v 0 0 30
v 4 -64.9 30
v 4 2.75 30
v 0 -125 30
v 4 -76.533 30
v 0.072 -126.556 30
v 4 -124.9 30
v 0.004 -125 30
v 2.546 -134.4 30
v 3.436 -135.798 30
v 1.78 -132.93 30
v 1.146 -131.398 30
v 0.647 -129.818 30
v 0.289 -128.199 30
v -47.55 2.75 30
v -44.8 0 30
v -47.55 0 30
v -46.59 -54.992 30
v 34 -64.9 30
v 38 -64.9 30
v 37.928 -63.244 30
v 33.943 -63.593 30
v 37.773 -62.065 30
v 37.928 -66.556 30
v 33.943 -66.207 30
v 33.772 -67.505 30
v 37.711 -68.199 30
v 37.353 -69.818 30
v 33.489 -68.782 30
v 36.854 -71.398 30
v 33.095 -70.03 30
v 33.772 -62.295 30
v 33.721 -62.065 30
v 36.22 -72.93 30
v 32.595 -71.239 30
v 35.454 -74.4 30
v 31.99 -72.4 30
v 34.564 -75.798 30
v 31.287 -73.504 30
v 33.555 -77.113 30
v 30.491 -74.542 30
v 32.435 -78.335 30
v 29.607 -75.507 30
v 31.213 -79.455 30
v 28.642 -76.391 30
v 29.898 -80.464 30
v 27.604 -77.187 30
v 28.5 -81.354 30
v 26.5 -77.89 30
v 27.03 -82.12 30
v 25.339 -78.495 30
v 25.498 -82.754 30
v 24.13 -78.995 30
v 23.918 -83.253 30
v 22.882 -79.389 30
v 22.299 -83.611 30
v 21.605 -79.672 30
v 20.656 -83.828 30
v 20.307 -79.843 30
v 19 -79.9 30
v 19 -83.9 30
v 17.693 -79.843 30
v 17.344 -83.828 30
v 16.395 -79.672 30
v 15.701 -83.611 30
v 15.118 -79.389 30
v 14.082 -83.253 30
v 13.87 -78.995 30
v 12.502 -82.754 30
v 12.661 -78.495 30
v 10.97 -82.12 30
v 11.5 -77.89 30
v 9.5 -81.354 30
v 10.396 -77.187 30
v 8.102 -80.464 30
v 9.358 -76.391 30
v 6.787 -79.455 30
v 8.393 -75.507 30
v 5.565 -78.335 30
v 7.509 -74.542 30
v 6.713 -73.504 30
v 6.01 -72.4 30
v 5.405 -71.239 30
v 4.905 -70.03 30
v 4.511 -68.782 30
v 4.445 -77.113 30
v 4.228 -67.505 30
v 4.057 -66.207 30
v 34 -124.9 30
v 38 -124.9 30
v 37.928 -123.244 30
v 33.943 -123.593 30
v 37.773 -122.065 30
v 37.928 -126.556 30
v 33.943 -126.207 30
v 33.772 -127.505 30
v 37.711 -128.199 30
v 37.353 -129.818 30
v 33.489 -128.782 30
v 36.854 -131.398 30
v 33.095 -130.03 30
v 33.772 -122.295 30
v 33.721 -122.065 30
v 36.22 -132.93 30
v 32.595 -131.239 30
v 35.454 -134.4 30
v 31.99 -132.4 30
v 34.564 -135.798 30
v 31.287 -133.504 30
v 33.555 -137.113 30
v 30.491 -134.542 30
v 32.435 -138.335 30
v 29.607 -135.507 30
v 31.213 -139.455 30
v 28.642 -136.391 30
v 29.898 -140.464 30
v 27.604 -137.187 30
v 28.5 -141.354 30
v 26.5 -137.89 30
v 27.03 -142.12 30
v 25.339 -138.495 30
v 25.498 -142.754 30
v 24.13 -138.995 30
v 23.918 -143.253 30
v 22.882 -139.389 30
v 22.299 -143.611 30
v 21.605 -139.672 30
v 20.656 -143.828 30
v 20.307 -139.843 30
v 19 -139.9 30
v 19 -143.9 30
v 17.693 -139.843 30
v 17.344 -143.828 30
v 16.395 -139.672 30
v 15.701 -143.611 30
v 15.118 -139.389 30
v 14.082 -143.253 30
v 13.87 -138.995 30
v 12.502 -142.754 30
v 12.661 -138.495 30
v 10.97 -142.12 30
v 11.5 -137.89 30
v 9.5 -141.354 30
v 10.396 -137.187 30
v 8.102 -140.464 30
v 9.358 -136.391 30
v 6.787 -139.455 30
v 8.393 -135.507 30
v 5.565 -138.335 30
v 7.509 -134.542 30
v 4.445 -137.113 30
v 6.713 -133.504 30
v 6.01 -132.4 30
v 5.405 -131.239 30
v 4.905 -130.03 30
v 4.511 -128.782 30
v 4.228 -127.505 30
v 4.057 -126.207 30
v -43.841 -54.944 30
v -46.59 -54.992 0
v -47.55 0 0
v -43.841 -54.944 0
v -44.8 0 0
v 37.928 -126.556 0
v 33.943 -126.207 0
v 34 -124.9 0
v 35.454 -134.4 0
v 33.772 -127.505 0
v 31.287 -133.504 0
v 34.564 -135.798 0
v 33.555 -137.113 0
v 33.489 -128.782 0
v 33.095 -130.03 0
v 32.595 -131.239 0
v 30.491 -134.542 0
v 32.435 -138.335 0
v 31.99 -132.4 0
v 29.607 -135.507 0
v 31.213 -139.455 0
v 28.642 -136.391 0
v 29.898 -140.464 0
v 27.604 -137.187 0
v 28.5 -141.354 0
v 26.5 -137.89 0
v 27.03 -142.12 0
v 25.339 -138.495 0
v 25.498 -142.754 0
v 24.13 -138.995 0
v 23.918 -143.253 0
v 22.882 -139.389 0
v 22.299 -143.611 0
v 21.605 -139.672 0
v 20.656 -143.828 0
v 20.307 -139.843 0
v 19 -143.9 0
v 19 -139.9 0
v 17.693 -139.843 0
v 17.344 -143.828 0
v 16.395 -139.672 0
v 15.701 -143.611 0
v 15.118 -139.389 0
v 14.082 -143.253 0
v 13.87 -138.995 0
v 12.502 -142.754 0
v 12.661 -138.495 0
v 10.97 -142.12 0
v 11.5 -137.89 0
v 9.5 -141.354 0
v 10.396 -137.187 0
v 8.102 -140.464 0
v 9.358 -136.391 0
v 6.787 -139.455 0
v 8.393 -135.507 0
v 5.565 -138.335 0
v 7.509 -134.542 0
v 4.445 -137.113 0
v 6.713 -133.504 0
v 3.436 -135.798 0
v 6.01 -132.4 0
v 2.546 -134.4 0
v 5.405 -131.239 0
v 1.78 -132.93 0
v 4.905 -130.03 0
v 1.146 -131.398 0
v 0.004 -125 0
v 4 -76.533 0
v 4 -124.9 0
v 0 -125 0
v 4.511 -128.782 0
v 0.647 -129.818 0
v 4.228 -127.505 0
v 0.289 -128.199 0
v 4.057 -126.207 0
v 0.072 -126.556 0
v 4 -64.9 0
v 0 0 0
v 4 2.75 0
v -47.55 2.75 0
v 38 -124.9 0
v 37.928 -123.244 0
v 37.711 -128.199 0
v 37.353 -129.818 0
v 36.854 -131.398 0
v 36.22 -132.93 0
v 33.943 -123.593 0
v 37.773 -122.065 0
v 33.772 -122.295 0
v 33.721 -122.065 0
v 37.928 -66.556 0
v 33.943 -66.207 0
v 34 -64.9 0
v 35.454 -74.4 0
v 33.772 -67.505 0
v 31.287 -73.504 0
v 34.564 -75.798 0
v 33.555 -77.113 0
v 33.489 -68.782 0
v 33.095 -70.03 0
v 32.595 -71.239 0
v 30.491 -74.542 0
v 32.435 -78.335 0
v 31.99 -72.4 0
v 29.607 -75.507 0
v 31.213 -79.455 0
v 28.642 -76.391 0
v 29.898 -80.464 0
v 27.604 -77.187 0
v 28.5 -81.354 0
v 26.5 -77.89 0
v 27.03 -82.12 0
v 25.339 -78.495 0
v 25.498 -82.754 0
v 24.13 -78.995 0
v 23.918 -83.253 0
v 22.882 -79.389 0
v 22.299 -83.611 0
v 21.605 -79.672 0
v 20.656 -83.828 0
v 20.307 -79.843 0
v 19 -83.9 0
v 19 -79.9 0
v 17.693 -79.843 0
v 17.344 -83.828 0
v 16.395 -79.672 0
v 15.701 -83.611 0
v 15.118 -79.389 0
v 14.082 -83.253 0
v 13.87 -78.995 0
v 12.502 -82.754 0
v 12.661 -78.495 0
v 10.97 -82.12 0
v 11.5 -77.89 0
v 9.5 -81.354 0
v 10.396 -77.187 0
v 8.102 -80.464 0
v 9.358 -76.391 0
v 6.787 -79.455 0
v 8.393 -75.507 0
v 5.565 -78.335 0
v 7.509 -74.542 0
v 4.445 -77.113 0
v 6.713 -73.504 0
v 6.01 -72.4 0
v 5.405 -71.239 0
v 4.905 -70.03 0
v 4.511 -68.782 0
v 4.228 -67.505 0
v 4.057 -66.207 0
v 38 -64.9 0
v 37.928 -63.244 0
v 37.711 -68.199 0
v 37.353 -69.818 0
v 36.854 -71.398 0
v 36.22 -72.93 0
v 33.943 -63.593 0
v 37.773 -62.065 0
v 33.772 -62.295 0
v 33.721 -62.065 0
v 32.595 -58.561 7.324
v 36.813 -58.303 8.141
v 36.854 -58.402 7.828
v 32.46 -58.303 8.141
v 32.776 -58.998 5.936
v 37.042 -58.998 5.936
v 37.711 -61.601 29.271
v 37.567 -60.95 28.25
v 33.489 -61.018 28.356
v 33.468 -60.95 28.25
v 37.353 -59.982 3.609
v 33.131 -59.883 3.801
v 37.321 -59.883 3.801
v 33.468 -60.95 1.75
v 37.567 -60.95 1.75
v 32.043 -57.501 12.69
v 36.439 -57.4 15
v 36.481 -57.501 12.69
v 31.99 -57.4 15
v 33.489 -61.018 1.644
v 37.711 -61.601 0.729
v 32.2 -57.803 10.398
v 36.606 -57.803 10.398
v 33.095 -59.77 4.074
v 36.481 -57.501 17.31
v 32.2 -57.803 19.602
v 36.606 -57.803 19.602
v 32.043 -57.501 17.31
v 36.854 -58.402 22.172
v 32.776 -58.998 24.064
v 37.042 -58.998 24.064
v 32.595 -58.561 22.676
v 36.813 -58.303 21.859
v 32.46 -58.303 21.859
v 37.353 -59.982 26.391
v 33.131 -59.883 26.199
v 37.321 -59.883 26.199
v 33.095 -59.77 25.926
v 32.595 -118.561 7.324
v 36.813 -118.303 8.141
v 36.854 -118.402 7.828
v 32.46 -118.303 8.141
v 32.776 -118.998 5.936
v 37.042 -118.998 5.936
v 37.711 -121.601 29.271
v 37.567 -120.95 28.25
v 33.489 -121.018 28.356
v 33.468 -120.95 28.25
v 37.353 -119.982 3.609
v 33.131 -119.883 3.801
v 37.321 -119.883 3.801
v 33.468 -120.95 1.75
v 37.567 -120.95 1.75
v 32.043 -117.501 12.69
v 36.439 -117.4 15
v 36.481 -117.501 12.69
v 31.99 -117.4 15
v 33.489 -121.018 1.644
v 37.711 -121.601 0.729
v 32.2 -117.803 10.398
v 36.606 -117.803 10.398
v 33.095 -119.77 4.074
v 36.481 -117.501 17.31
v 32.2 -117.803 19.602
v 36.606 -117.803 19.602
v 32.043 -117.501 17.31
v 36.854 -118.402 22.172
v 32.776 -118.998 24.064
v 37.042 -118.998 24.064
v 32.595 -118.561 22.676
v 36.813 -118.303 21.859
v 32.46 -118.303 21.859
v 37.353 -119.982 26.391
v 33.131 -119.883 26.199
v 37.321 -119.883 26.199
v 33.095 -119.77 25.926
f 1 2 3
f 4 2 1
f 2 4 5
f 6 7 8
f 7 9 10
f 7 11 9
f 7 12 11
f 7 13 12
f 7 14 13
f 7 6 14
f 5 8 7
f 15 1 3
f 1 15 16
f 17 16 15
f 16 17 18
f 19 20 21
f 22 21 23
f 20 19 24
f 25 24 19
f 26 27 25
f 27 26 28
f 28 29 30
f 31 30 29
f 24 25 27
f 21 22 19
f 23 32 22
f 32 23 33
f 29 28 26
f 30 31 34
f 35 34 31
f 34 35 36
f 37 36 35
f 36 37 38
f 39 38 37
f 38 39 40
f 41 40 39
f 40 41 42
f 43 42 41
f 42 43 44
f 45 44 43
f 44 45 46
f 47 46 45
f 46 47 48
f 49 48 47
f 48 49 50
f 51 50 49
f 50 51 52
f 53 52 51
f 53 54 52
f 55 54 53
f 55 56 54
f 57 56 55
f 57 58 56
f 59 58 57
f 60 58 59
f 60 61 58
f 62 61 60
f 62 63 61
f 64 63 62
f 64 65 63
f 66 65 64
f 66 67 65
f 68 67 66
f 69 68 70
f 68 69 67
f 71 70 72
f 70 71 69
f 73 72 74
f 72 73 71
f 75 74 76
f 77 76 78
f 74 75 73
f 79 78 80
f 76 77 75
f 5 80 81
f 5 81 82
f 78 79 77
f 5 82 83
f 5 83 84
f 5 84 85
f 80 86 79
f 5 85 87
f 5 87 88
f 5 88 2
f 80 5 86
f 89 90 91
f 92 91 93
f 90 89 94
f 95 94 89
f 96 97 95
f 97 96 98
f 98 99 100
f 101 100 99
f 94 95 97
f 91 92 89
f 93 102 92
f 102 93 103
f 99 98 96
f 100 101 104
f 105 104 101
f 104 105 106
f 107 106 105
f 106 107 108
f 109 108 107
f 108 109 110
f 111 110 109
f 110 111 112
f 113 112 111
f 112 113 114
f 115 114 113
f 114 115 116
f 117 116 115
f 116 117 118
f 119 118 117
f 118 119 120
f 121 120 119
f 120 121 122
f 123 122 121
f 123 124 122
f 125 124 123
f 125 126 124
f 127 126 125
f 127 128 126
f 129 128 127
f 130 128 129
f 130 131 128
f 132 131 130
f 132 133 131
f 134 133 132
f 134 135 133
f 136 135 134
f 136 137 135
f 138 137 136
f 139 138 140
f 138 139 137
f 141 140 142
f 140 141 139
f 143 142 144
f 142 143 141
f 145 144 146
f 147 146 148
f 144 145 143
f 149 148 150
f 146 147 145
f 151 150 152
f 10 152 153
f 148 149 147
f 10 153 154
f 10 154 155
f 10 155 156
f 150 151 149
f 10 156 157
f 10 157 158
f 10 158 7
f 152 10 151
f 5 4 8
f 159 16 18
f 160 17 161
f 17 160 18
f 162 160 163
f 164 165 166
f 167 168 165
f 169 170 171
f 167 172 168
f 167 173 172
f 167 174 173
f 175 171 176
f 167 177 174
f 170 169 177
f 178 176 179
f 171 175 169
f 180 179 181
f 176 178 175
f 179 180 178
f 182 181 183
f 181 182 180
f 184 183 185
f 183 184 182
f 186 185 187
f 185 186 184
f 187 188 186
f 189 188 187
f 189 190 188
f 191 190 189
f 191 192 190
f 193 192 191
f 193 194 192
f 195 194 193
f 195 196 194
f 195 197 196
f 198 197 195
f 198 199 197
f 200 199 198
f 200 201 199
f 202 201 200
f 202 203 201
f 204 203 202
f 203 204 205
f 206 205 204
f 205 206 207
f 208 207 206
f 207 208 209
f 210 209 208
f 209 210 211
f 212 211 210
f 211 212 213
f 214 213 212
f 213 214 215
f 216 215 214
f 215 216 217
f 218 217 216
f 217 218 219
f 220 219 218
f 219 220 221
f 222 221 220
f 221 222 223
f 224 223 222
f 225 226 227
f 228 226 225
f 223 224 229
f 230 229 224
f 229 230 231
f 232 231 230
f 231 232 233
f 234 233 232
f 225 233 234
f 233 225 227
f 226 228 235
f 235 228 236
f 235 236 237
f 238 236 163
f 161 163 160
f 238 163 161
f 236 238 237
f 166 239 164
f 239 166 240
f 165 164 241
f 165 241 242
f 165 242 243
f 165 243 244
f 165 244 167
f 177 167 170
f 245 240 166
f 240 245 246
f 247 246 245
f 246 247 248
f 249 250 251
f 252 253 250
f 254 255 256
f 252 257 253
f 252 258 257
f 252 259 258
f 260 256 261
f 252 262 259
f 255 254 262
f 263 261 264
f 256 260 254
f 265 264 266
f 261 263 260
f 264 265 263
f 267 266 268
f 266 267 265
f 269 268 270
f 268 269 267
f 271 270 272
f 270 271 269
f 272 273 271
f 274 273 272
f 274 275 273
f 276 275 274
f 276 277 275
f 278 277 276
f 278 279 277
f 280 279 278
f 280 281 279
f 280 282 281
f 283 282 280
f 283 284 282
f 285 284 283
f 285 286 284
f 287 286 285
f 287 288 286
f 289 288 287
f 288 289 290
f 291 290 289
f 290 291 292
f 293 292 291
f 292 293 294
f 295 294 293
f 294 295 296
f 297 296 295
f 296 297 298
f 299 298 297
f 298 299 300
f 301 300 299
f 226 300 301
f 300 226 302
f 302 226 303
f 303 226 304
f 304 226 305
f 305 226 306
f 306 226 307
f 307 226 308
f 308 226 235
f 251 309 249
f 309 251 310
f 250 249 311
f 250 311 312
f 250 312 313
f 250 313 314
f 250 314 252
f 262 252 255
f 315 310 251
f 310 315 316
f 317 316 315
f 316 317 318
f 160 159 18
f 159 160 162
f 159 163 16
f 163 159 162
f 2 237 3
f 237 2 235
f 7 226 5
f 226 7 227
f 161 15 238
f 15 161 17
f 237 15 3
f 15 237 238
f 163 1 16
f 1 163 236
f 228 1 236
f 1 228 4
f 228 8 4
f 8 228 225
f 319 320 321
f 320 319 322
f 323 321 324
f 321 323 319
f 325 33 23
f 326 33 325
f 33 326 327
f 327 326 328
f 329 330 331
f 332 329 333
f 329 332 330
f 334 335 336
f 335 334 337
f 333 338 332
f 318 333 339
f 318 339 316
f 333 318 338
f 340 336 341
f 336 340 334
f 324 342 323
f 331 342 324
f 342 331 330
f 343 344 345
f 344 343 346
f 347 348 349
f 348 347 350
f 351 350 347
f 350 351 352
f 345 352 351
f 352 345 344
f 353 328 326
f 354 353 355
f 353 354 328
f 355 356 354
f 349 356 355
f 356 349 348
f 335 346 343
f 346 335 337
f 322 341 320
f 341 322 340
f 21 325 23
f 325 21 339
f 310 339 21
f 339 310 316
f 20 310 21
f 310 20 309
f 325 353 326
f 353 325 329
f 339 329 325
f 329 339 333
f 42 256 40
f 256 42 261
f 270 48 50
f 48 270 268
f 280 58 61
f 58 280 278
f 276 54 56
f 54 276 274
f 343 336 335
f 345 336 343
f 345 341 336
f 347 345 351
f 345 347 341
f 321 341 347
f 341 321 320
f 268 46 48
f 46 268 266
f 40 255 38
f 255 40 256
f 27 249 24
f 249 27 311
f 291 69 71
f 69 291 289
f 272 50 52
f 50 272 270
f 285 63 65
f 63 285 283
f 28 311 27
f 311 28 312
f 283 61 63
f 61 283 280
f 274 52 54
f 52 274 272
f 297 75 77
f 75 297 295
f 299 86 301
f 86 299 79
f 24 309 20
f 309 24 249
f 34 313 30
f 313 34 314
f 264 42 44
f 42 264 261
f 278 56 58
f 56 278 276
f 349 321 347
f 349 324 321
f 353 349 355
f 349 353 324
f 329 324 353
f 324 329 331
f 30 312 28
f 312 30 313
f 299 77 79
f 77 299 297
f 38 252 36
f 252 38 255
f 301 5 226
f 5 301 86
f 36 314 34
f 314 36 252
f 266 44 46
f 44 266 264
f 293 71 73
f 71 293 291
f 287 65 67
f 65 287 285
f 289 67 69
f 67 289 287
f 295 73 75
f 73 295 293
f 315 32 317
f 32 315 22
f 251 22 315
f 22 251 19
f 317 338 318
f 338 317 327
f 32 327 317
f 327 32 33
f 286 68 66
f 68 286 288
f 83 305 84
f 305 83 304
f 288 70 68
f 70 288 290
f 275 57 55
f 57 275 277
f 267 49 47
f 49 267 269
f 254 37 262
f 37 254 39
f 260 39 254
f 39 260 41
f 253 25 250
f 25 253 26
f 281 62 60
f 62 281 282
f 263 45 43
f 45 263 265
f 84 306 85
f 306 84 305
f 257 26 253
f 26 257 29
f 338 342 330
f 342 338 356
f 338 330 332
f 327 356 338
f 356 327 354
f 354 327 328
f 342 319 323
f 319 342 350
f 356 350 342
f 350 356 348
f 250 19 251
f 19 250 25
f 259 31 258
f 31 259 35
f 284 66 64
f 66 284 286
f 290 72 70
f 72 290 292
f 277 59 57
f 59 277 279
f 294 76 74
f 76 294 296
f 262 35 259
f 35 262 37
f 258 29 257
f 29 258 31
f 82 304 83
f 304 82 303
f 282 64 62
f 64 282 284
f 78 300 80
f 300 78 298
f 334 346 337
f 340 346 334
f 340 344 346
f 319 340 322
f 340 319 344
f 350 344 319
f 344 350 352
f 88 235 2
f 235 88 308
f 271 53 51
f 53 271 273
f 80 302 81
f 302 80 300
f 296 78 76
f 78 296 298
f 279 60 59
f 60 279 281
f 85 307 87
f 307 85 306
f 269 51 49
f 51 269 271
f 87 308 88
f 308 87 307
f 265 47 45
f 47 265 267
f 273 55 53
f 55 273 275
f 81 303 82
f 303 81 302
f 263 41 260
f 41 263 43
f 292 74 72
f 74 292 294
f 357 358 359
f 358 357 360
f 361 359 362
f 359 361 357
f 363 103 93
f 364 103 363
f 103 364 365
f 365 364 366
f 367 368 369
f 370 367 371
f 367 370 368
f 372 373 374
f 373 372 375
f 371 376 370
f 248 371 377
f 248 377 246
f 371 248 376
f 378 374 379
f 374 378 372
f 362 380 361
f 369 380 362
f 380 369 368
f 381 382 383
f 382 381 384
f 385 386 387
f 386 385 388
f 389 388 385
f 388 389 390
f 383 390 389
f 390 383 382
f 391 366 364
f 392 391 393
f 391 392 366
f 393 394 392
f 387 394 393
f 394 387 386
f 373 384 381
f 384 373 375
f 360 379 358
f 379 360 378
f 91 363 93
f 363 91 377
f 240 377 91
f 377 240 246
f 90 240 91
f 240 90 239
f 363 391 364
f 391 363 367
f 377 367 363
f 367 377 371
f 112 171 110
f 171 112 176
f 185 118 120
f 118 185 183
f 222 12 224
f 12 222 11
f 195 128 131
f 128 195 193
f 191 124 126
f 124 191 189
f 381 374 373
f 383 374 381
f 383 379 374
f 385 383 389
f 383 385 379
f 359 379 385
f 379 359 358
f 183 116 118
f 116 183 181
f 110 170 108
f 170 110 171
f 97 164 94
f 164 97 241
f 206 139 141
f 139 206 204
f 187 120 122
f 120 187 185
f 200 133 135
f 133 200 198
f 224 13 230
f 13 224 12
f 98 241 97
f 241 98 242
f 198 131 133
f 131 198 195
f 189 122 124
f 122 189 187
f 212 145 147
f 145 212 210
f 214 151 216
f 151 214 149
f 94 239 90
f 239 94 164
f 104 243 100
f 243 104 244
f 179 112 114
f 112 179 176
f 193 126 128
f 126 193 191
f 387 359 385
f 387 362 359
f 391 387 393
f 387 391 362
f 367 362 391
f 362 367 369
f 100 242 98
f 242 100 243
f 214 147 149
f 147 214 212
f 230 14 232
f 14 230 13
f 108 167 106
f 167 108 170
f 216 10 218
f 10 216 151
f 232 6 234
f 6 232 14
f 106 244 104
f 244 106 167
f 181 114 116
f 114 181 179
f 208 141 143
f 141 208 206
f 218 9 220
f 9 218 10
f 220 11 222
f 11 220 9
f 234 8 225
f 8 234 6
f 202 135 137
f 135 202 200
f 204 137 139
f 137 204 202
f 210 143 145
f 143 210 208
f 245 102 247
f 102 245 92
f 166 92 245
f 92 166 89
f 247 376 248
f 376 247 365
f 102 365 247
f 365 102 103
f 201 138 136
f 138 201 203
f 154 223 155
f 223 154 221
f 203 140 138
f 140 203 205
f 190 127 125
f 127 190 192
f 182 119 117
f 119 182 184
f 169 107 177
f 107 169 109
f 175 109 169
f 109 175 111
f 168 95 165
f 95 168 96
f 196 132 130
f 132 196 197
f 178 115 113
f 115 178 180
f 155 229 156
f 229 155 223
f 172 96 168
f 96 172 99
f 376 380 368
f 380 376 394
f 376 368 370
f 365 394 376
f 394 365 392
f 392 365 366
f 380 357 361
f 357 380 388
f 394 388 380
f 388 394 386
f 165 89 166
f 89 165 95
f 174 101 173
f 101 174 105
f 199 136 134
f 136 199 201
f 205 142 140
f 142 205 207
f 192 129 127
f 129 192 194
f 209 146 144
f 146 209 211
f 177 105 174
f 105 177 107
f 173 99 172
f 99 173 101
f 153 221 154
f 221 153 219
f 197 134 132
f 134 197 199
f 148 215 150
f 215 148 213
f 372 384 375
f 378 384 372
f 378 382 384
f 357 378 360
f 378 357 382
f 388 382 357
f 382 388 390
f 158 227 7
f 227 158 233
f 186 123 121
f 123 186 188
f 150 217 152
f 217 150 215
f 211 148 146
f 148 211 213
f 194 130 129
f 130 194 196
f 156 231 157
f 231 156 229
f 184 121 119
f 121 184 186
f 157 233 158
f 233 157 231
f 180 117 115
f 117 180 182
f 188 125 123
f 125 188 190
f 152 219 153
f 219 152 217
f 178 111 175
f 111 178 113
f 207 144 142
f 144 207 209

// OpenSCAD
// [FL_INDEX: keywords="openscad, 3d_parametric, Customizable_door_hook_hanger, csg_solid" | COT="Parametric OpenSCAD design from 3DCodeverse"]
// Title: Customizable door hook hanger

/* [Door parameters] */
// Door thickness (inner distance between front and back of door hook)
clip_depth = 44.8;
// Thickness of top and overhang (make sure it fits gap between door and frame)
top_and_back_thickness = 2.75;

/* [Hook parameters] */
// Width of entire hook
width = 30;
// Thickness of front piece and hanger hooks
hook_and_front_thickness = 4;
// Length of overhang on back side of the door
clip_length = 55;


number_of_hooks = 2;
// Distance between top of door and first hanger hook
first_hook_offset = 65;  // rounded: 60
// Distance between successive hanger hooks (if more than one)
hook_distance = 60;  // rounded: 60
// Radius of hanger hook curve
hook_radius = 15;

hook_style = "rounded"; // [simple:Simple,rounded:Rounded]

/* [Advanced] */

// Angle back of clip inwards (towards door), to help with friction; don't go crazy with this or you'll put too much stress on clip
clip_angle = 1;
// Add support buttress on hooks (except last); might help reduce flex, but looks a bit uglier (IMO)
inner_hook_buttress = 0; // [0:No,1:Yes]


/* [Hidden] */

$fn = 72;
thickness = hook_and_front_thickness;
top_thickness = top_and_back_thickness;

module hook_base() {
  difference() {
    cylinder(h=width, r=hook_radius+thickness);
    translate([0,0,-1])
      cylinder(h=width+2, r=hook_radius);
    translate([-hook_radius-thickness-1, 0, -1]) 
      cube([2*(hook_radius+thickness+1), hook_radius+thickness+1, width+2]); 
  }
}

module simple_hook() {
  translate([hook_radius+thickness, 0, 0]) union() {
    hook_base();
    translate([hook_radius+thickness/2, 0, 0])
      cylinder(h=width, r=thickness/2, $fn=18);
  }
}

module rounded_hook0() {
  translate([hook_radius+thickness, 0, 0]) union(r=2) {
    hook_base();
    translate([thickness+hook_radius, 0, width/2]) rotate([0, 90, 180]) difference() {
      cylinder(h=thickness, r=width/2);
      //translate([-width/2, -width/2, 0]) cube([width,width,thickness]);
      translate([-width-1, .5, -1])
        cube([2*width+2, width+1, thickness+2]);
    }
  }
}

module rounded_hook() {
  translate([0, -hook_radius-thickness, 0]) difference() {
    intersection() {
      cube([2*(hook_radius+thickness), 1.5*hook_radius+thickness+1, width]);
      translate([0, 0, width/2]) rotate([0, 90, 0]) cylinder(h=2*(hook_radius+thickness), r=1.5*hook_radius+thickness);
      translate([hook_radius+thickness, hook_radius+thickness, -1]) cylinder(r=hook_radius+thickness, h=width+2);
    }
    translate([hook_radius+thickness, hook_radius+thickness, -1]) cylinder(r=hook_radius, h=width+2);
    translate([-1, hook_radius+thickness, -1]) cube([hook_radius+thickness+2, hook_radius, width+2]);
  }
}

module hook() {
  if (hook_style == "simple") {
    simple_hook();
  } else if (hook_style == "rounded") {
    rounded_hook();
  }
}

module clip() {
  front_length = first_hook_offset + (number_of_hooks - 1) * hook_distance;
  union() {
    translate([-clip_depth-top_thickness, 0, 0]) rotate([0, 0, clip_angle]) translate([0, -clip_length, 0])
      cube([top_thickness, clip_length, width]);
    translate([-clip_depth-top_thickness, 0, 0])
      cube([clip_depth + top_thickness + thickness, top_thickness, width]);
    translate([0, -front_length, 0])
      cube([thickness, front_length, width]);
  }
}

module door_hook() {
  butt_theta = acos(hook_radius/(hook_radius+thickness));
  clip();
  for (i = [0:(number_of_hooks-1)]) {
    translate([0, -first_hook_offset-i*hook_distance+.1, 0]) union() {
      hook();
      if ((i < number_of_hooks-1) && (inner_hook_buttress != 0)) {
        translate([0,-(hook_radius+thickness)*tan(butt_theta),0]) rotate([0, 0, butt_theta]) translate([0, -thickness, 0]) cube([thickness*(1+1/cos(butt_theta)),thickness,width]);
      }
    }
  }
}

door_hook();
